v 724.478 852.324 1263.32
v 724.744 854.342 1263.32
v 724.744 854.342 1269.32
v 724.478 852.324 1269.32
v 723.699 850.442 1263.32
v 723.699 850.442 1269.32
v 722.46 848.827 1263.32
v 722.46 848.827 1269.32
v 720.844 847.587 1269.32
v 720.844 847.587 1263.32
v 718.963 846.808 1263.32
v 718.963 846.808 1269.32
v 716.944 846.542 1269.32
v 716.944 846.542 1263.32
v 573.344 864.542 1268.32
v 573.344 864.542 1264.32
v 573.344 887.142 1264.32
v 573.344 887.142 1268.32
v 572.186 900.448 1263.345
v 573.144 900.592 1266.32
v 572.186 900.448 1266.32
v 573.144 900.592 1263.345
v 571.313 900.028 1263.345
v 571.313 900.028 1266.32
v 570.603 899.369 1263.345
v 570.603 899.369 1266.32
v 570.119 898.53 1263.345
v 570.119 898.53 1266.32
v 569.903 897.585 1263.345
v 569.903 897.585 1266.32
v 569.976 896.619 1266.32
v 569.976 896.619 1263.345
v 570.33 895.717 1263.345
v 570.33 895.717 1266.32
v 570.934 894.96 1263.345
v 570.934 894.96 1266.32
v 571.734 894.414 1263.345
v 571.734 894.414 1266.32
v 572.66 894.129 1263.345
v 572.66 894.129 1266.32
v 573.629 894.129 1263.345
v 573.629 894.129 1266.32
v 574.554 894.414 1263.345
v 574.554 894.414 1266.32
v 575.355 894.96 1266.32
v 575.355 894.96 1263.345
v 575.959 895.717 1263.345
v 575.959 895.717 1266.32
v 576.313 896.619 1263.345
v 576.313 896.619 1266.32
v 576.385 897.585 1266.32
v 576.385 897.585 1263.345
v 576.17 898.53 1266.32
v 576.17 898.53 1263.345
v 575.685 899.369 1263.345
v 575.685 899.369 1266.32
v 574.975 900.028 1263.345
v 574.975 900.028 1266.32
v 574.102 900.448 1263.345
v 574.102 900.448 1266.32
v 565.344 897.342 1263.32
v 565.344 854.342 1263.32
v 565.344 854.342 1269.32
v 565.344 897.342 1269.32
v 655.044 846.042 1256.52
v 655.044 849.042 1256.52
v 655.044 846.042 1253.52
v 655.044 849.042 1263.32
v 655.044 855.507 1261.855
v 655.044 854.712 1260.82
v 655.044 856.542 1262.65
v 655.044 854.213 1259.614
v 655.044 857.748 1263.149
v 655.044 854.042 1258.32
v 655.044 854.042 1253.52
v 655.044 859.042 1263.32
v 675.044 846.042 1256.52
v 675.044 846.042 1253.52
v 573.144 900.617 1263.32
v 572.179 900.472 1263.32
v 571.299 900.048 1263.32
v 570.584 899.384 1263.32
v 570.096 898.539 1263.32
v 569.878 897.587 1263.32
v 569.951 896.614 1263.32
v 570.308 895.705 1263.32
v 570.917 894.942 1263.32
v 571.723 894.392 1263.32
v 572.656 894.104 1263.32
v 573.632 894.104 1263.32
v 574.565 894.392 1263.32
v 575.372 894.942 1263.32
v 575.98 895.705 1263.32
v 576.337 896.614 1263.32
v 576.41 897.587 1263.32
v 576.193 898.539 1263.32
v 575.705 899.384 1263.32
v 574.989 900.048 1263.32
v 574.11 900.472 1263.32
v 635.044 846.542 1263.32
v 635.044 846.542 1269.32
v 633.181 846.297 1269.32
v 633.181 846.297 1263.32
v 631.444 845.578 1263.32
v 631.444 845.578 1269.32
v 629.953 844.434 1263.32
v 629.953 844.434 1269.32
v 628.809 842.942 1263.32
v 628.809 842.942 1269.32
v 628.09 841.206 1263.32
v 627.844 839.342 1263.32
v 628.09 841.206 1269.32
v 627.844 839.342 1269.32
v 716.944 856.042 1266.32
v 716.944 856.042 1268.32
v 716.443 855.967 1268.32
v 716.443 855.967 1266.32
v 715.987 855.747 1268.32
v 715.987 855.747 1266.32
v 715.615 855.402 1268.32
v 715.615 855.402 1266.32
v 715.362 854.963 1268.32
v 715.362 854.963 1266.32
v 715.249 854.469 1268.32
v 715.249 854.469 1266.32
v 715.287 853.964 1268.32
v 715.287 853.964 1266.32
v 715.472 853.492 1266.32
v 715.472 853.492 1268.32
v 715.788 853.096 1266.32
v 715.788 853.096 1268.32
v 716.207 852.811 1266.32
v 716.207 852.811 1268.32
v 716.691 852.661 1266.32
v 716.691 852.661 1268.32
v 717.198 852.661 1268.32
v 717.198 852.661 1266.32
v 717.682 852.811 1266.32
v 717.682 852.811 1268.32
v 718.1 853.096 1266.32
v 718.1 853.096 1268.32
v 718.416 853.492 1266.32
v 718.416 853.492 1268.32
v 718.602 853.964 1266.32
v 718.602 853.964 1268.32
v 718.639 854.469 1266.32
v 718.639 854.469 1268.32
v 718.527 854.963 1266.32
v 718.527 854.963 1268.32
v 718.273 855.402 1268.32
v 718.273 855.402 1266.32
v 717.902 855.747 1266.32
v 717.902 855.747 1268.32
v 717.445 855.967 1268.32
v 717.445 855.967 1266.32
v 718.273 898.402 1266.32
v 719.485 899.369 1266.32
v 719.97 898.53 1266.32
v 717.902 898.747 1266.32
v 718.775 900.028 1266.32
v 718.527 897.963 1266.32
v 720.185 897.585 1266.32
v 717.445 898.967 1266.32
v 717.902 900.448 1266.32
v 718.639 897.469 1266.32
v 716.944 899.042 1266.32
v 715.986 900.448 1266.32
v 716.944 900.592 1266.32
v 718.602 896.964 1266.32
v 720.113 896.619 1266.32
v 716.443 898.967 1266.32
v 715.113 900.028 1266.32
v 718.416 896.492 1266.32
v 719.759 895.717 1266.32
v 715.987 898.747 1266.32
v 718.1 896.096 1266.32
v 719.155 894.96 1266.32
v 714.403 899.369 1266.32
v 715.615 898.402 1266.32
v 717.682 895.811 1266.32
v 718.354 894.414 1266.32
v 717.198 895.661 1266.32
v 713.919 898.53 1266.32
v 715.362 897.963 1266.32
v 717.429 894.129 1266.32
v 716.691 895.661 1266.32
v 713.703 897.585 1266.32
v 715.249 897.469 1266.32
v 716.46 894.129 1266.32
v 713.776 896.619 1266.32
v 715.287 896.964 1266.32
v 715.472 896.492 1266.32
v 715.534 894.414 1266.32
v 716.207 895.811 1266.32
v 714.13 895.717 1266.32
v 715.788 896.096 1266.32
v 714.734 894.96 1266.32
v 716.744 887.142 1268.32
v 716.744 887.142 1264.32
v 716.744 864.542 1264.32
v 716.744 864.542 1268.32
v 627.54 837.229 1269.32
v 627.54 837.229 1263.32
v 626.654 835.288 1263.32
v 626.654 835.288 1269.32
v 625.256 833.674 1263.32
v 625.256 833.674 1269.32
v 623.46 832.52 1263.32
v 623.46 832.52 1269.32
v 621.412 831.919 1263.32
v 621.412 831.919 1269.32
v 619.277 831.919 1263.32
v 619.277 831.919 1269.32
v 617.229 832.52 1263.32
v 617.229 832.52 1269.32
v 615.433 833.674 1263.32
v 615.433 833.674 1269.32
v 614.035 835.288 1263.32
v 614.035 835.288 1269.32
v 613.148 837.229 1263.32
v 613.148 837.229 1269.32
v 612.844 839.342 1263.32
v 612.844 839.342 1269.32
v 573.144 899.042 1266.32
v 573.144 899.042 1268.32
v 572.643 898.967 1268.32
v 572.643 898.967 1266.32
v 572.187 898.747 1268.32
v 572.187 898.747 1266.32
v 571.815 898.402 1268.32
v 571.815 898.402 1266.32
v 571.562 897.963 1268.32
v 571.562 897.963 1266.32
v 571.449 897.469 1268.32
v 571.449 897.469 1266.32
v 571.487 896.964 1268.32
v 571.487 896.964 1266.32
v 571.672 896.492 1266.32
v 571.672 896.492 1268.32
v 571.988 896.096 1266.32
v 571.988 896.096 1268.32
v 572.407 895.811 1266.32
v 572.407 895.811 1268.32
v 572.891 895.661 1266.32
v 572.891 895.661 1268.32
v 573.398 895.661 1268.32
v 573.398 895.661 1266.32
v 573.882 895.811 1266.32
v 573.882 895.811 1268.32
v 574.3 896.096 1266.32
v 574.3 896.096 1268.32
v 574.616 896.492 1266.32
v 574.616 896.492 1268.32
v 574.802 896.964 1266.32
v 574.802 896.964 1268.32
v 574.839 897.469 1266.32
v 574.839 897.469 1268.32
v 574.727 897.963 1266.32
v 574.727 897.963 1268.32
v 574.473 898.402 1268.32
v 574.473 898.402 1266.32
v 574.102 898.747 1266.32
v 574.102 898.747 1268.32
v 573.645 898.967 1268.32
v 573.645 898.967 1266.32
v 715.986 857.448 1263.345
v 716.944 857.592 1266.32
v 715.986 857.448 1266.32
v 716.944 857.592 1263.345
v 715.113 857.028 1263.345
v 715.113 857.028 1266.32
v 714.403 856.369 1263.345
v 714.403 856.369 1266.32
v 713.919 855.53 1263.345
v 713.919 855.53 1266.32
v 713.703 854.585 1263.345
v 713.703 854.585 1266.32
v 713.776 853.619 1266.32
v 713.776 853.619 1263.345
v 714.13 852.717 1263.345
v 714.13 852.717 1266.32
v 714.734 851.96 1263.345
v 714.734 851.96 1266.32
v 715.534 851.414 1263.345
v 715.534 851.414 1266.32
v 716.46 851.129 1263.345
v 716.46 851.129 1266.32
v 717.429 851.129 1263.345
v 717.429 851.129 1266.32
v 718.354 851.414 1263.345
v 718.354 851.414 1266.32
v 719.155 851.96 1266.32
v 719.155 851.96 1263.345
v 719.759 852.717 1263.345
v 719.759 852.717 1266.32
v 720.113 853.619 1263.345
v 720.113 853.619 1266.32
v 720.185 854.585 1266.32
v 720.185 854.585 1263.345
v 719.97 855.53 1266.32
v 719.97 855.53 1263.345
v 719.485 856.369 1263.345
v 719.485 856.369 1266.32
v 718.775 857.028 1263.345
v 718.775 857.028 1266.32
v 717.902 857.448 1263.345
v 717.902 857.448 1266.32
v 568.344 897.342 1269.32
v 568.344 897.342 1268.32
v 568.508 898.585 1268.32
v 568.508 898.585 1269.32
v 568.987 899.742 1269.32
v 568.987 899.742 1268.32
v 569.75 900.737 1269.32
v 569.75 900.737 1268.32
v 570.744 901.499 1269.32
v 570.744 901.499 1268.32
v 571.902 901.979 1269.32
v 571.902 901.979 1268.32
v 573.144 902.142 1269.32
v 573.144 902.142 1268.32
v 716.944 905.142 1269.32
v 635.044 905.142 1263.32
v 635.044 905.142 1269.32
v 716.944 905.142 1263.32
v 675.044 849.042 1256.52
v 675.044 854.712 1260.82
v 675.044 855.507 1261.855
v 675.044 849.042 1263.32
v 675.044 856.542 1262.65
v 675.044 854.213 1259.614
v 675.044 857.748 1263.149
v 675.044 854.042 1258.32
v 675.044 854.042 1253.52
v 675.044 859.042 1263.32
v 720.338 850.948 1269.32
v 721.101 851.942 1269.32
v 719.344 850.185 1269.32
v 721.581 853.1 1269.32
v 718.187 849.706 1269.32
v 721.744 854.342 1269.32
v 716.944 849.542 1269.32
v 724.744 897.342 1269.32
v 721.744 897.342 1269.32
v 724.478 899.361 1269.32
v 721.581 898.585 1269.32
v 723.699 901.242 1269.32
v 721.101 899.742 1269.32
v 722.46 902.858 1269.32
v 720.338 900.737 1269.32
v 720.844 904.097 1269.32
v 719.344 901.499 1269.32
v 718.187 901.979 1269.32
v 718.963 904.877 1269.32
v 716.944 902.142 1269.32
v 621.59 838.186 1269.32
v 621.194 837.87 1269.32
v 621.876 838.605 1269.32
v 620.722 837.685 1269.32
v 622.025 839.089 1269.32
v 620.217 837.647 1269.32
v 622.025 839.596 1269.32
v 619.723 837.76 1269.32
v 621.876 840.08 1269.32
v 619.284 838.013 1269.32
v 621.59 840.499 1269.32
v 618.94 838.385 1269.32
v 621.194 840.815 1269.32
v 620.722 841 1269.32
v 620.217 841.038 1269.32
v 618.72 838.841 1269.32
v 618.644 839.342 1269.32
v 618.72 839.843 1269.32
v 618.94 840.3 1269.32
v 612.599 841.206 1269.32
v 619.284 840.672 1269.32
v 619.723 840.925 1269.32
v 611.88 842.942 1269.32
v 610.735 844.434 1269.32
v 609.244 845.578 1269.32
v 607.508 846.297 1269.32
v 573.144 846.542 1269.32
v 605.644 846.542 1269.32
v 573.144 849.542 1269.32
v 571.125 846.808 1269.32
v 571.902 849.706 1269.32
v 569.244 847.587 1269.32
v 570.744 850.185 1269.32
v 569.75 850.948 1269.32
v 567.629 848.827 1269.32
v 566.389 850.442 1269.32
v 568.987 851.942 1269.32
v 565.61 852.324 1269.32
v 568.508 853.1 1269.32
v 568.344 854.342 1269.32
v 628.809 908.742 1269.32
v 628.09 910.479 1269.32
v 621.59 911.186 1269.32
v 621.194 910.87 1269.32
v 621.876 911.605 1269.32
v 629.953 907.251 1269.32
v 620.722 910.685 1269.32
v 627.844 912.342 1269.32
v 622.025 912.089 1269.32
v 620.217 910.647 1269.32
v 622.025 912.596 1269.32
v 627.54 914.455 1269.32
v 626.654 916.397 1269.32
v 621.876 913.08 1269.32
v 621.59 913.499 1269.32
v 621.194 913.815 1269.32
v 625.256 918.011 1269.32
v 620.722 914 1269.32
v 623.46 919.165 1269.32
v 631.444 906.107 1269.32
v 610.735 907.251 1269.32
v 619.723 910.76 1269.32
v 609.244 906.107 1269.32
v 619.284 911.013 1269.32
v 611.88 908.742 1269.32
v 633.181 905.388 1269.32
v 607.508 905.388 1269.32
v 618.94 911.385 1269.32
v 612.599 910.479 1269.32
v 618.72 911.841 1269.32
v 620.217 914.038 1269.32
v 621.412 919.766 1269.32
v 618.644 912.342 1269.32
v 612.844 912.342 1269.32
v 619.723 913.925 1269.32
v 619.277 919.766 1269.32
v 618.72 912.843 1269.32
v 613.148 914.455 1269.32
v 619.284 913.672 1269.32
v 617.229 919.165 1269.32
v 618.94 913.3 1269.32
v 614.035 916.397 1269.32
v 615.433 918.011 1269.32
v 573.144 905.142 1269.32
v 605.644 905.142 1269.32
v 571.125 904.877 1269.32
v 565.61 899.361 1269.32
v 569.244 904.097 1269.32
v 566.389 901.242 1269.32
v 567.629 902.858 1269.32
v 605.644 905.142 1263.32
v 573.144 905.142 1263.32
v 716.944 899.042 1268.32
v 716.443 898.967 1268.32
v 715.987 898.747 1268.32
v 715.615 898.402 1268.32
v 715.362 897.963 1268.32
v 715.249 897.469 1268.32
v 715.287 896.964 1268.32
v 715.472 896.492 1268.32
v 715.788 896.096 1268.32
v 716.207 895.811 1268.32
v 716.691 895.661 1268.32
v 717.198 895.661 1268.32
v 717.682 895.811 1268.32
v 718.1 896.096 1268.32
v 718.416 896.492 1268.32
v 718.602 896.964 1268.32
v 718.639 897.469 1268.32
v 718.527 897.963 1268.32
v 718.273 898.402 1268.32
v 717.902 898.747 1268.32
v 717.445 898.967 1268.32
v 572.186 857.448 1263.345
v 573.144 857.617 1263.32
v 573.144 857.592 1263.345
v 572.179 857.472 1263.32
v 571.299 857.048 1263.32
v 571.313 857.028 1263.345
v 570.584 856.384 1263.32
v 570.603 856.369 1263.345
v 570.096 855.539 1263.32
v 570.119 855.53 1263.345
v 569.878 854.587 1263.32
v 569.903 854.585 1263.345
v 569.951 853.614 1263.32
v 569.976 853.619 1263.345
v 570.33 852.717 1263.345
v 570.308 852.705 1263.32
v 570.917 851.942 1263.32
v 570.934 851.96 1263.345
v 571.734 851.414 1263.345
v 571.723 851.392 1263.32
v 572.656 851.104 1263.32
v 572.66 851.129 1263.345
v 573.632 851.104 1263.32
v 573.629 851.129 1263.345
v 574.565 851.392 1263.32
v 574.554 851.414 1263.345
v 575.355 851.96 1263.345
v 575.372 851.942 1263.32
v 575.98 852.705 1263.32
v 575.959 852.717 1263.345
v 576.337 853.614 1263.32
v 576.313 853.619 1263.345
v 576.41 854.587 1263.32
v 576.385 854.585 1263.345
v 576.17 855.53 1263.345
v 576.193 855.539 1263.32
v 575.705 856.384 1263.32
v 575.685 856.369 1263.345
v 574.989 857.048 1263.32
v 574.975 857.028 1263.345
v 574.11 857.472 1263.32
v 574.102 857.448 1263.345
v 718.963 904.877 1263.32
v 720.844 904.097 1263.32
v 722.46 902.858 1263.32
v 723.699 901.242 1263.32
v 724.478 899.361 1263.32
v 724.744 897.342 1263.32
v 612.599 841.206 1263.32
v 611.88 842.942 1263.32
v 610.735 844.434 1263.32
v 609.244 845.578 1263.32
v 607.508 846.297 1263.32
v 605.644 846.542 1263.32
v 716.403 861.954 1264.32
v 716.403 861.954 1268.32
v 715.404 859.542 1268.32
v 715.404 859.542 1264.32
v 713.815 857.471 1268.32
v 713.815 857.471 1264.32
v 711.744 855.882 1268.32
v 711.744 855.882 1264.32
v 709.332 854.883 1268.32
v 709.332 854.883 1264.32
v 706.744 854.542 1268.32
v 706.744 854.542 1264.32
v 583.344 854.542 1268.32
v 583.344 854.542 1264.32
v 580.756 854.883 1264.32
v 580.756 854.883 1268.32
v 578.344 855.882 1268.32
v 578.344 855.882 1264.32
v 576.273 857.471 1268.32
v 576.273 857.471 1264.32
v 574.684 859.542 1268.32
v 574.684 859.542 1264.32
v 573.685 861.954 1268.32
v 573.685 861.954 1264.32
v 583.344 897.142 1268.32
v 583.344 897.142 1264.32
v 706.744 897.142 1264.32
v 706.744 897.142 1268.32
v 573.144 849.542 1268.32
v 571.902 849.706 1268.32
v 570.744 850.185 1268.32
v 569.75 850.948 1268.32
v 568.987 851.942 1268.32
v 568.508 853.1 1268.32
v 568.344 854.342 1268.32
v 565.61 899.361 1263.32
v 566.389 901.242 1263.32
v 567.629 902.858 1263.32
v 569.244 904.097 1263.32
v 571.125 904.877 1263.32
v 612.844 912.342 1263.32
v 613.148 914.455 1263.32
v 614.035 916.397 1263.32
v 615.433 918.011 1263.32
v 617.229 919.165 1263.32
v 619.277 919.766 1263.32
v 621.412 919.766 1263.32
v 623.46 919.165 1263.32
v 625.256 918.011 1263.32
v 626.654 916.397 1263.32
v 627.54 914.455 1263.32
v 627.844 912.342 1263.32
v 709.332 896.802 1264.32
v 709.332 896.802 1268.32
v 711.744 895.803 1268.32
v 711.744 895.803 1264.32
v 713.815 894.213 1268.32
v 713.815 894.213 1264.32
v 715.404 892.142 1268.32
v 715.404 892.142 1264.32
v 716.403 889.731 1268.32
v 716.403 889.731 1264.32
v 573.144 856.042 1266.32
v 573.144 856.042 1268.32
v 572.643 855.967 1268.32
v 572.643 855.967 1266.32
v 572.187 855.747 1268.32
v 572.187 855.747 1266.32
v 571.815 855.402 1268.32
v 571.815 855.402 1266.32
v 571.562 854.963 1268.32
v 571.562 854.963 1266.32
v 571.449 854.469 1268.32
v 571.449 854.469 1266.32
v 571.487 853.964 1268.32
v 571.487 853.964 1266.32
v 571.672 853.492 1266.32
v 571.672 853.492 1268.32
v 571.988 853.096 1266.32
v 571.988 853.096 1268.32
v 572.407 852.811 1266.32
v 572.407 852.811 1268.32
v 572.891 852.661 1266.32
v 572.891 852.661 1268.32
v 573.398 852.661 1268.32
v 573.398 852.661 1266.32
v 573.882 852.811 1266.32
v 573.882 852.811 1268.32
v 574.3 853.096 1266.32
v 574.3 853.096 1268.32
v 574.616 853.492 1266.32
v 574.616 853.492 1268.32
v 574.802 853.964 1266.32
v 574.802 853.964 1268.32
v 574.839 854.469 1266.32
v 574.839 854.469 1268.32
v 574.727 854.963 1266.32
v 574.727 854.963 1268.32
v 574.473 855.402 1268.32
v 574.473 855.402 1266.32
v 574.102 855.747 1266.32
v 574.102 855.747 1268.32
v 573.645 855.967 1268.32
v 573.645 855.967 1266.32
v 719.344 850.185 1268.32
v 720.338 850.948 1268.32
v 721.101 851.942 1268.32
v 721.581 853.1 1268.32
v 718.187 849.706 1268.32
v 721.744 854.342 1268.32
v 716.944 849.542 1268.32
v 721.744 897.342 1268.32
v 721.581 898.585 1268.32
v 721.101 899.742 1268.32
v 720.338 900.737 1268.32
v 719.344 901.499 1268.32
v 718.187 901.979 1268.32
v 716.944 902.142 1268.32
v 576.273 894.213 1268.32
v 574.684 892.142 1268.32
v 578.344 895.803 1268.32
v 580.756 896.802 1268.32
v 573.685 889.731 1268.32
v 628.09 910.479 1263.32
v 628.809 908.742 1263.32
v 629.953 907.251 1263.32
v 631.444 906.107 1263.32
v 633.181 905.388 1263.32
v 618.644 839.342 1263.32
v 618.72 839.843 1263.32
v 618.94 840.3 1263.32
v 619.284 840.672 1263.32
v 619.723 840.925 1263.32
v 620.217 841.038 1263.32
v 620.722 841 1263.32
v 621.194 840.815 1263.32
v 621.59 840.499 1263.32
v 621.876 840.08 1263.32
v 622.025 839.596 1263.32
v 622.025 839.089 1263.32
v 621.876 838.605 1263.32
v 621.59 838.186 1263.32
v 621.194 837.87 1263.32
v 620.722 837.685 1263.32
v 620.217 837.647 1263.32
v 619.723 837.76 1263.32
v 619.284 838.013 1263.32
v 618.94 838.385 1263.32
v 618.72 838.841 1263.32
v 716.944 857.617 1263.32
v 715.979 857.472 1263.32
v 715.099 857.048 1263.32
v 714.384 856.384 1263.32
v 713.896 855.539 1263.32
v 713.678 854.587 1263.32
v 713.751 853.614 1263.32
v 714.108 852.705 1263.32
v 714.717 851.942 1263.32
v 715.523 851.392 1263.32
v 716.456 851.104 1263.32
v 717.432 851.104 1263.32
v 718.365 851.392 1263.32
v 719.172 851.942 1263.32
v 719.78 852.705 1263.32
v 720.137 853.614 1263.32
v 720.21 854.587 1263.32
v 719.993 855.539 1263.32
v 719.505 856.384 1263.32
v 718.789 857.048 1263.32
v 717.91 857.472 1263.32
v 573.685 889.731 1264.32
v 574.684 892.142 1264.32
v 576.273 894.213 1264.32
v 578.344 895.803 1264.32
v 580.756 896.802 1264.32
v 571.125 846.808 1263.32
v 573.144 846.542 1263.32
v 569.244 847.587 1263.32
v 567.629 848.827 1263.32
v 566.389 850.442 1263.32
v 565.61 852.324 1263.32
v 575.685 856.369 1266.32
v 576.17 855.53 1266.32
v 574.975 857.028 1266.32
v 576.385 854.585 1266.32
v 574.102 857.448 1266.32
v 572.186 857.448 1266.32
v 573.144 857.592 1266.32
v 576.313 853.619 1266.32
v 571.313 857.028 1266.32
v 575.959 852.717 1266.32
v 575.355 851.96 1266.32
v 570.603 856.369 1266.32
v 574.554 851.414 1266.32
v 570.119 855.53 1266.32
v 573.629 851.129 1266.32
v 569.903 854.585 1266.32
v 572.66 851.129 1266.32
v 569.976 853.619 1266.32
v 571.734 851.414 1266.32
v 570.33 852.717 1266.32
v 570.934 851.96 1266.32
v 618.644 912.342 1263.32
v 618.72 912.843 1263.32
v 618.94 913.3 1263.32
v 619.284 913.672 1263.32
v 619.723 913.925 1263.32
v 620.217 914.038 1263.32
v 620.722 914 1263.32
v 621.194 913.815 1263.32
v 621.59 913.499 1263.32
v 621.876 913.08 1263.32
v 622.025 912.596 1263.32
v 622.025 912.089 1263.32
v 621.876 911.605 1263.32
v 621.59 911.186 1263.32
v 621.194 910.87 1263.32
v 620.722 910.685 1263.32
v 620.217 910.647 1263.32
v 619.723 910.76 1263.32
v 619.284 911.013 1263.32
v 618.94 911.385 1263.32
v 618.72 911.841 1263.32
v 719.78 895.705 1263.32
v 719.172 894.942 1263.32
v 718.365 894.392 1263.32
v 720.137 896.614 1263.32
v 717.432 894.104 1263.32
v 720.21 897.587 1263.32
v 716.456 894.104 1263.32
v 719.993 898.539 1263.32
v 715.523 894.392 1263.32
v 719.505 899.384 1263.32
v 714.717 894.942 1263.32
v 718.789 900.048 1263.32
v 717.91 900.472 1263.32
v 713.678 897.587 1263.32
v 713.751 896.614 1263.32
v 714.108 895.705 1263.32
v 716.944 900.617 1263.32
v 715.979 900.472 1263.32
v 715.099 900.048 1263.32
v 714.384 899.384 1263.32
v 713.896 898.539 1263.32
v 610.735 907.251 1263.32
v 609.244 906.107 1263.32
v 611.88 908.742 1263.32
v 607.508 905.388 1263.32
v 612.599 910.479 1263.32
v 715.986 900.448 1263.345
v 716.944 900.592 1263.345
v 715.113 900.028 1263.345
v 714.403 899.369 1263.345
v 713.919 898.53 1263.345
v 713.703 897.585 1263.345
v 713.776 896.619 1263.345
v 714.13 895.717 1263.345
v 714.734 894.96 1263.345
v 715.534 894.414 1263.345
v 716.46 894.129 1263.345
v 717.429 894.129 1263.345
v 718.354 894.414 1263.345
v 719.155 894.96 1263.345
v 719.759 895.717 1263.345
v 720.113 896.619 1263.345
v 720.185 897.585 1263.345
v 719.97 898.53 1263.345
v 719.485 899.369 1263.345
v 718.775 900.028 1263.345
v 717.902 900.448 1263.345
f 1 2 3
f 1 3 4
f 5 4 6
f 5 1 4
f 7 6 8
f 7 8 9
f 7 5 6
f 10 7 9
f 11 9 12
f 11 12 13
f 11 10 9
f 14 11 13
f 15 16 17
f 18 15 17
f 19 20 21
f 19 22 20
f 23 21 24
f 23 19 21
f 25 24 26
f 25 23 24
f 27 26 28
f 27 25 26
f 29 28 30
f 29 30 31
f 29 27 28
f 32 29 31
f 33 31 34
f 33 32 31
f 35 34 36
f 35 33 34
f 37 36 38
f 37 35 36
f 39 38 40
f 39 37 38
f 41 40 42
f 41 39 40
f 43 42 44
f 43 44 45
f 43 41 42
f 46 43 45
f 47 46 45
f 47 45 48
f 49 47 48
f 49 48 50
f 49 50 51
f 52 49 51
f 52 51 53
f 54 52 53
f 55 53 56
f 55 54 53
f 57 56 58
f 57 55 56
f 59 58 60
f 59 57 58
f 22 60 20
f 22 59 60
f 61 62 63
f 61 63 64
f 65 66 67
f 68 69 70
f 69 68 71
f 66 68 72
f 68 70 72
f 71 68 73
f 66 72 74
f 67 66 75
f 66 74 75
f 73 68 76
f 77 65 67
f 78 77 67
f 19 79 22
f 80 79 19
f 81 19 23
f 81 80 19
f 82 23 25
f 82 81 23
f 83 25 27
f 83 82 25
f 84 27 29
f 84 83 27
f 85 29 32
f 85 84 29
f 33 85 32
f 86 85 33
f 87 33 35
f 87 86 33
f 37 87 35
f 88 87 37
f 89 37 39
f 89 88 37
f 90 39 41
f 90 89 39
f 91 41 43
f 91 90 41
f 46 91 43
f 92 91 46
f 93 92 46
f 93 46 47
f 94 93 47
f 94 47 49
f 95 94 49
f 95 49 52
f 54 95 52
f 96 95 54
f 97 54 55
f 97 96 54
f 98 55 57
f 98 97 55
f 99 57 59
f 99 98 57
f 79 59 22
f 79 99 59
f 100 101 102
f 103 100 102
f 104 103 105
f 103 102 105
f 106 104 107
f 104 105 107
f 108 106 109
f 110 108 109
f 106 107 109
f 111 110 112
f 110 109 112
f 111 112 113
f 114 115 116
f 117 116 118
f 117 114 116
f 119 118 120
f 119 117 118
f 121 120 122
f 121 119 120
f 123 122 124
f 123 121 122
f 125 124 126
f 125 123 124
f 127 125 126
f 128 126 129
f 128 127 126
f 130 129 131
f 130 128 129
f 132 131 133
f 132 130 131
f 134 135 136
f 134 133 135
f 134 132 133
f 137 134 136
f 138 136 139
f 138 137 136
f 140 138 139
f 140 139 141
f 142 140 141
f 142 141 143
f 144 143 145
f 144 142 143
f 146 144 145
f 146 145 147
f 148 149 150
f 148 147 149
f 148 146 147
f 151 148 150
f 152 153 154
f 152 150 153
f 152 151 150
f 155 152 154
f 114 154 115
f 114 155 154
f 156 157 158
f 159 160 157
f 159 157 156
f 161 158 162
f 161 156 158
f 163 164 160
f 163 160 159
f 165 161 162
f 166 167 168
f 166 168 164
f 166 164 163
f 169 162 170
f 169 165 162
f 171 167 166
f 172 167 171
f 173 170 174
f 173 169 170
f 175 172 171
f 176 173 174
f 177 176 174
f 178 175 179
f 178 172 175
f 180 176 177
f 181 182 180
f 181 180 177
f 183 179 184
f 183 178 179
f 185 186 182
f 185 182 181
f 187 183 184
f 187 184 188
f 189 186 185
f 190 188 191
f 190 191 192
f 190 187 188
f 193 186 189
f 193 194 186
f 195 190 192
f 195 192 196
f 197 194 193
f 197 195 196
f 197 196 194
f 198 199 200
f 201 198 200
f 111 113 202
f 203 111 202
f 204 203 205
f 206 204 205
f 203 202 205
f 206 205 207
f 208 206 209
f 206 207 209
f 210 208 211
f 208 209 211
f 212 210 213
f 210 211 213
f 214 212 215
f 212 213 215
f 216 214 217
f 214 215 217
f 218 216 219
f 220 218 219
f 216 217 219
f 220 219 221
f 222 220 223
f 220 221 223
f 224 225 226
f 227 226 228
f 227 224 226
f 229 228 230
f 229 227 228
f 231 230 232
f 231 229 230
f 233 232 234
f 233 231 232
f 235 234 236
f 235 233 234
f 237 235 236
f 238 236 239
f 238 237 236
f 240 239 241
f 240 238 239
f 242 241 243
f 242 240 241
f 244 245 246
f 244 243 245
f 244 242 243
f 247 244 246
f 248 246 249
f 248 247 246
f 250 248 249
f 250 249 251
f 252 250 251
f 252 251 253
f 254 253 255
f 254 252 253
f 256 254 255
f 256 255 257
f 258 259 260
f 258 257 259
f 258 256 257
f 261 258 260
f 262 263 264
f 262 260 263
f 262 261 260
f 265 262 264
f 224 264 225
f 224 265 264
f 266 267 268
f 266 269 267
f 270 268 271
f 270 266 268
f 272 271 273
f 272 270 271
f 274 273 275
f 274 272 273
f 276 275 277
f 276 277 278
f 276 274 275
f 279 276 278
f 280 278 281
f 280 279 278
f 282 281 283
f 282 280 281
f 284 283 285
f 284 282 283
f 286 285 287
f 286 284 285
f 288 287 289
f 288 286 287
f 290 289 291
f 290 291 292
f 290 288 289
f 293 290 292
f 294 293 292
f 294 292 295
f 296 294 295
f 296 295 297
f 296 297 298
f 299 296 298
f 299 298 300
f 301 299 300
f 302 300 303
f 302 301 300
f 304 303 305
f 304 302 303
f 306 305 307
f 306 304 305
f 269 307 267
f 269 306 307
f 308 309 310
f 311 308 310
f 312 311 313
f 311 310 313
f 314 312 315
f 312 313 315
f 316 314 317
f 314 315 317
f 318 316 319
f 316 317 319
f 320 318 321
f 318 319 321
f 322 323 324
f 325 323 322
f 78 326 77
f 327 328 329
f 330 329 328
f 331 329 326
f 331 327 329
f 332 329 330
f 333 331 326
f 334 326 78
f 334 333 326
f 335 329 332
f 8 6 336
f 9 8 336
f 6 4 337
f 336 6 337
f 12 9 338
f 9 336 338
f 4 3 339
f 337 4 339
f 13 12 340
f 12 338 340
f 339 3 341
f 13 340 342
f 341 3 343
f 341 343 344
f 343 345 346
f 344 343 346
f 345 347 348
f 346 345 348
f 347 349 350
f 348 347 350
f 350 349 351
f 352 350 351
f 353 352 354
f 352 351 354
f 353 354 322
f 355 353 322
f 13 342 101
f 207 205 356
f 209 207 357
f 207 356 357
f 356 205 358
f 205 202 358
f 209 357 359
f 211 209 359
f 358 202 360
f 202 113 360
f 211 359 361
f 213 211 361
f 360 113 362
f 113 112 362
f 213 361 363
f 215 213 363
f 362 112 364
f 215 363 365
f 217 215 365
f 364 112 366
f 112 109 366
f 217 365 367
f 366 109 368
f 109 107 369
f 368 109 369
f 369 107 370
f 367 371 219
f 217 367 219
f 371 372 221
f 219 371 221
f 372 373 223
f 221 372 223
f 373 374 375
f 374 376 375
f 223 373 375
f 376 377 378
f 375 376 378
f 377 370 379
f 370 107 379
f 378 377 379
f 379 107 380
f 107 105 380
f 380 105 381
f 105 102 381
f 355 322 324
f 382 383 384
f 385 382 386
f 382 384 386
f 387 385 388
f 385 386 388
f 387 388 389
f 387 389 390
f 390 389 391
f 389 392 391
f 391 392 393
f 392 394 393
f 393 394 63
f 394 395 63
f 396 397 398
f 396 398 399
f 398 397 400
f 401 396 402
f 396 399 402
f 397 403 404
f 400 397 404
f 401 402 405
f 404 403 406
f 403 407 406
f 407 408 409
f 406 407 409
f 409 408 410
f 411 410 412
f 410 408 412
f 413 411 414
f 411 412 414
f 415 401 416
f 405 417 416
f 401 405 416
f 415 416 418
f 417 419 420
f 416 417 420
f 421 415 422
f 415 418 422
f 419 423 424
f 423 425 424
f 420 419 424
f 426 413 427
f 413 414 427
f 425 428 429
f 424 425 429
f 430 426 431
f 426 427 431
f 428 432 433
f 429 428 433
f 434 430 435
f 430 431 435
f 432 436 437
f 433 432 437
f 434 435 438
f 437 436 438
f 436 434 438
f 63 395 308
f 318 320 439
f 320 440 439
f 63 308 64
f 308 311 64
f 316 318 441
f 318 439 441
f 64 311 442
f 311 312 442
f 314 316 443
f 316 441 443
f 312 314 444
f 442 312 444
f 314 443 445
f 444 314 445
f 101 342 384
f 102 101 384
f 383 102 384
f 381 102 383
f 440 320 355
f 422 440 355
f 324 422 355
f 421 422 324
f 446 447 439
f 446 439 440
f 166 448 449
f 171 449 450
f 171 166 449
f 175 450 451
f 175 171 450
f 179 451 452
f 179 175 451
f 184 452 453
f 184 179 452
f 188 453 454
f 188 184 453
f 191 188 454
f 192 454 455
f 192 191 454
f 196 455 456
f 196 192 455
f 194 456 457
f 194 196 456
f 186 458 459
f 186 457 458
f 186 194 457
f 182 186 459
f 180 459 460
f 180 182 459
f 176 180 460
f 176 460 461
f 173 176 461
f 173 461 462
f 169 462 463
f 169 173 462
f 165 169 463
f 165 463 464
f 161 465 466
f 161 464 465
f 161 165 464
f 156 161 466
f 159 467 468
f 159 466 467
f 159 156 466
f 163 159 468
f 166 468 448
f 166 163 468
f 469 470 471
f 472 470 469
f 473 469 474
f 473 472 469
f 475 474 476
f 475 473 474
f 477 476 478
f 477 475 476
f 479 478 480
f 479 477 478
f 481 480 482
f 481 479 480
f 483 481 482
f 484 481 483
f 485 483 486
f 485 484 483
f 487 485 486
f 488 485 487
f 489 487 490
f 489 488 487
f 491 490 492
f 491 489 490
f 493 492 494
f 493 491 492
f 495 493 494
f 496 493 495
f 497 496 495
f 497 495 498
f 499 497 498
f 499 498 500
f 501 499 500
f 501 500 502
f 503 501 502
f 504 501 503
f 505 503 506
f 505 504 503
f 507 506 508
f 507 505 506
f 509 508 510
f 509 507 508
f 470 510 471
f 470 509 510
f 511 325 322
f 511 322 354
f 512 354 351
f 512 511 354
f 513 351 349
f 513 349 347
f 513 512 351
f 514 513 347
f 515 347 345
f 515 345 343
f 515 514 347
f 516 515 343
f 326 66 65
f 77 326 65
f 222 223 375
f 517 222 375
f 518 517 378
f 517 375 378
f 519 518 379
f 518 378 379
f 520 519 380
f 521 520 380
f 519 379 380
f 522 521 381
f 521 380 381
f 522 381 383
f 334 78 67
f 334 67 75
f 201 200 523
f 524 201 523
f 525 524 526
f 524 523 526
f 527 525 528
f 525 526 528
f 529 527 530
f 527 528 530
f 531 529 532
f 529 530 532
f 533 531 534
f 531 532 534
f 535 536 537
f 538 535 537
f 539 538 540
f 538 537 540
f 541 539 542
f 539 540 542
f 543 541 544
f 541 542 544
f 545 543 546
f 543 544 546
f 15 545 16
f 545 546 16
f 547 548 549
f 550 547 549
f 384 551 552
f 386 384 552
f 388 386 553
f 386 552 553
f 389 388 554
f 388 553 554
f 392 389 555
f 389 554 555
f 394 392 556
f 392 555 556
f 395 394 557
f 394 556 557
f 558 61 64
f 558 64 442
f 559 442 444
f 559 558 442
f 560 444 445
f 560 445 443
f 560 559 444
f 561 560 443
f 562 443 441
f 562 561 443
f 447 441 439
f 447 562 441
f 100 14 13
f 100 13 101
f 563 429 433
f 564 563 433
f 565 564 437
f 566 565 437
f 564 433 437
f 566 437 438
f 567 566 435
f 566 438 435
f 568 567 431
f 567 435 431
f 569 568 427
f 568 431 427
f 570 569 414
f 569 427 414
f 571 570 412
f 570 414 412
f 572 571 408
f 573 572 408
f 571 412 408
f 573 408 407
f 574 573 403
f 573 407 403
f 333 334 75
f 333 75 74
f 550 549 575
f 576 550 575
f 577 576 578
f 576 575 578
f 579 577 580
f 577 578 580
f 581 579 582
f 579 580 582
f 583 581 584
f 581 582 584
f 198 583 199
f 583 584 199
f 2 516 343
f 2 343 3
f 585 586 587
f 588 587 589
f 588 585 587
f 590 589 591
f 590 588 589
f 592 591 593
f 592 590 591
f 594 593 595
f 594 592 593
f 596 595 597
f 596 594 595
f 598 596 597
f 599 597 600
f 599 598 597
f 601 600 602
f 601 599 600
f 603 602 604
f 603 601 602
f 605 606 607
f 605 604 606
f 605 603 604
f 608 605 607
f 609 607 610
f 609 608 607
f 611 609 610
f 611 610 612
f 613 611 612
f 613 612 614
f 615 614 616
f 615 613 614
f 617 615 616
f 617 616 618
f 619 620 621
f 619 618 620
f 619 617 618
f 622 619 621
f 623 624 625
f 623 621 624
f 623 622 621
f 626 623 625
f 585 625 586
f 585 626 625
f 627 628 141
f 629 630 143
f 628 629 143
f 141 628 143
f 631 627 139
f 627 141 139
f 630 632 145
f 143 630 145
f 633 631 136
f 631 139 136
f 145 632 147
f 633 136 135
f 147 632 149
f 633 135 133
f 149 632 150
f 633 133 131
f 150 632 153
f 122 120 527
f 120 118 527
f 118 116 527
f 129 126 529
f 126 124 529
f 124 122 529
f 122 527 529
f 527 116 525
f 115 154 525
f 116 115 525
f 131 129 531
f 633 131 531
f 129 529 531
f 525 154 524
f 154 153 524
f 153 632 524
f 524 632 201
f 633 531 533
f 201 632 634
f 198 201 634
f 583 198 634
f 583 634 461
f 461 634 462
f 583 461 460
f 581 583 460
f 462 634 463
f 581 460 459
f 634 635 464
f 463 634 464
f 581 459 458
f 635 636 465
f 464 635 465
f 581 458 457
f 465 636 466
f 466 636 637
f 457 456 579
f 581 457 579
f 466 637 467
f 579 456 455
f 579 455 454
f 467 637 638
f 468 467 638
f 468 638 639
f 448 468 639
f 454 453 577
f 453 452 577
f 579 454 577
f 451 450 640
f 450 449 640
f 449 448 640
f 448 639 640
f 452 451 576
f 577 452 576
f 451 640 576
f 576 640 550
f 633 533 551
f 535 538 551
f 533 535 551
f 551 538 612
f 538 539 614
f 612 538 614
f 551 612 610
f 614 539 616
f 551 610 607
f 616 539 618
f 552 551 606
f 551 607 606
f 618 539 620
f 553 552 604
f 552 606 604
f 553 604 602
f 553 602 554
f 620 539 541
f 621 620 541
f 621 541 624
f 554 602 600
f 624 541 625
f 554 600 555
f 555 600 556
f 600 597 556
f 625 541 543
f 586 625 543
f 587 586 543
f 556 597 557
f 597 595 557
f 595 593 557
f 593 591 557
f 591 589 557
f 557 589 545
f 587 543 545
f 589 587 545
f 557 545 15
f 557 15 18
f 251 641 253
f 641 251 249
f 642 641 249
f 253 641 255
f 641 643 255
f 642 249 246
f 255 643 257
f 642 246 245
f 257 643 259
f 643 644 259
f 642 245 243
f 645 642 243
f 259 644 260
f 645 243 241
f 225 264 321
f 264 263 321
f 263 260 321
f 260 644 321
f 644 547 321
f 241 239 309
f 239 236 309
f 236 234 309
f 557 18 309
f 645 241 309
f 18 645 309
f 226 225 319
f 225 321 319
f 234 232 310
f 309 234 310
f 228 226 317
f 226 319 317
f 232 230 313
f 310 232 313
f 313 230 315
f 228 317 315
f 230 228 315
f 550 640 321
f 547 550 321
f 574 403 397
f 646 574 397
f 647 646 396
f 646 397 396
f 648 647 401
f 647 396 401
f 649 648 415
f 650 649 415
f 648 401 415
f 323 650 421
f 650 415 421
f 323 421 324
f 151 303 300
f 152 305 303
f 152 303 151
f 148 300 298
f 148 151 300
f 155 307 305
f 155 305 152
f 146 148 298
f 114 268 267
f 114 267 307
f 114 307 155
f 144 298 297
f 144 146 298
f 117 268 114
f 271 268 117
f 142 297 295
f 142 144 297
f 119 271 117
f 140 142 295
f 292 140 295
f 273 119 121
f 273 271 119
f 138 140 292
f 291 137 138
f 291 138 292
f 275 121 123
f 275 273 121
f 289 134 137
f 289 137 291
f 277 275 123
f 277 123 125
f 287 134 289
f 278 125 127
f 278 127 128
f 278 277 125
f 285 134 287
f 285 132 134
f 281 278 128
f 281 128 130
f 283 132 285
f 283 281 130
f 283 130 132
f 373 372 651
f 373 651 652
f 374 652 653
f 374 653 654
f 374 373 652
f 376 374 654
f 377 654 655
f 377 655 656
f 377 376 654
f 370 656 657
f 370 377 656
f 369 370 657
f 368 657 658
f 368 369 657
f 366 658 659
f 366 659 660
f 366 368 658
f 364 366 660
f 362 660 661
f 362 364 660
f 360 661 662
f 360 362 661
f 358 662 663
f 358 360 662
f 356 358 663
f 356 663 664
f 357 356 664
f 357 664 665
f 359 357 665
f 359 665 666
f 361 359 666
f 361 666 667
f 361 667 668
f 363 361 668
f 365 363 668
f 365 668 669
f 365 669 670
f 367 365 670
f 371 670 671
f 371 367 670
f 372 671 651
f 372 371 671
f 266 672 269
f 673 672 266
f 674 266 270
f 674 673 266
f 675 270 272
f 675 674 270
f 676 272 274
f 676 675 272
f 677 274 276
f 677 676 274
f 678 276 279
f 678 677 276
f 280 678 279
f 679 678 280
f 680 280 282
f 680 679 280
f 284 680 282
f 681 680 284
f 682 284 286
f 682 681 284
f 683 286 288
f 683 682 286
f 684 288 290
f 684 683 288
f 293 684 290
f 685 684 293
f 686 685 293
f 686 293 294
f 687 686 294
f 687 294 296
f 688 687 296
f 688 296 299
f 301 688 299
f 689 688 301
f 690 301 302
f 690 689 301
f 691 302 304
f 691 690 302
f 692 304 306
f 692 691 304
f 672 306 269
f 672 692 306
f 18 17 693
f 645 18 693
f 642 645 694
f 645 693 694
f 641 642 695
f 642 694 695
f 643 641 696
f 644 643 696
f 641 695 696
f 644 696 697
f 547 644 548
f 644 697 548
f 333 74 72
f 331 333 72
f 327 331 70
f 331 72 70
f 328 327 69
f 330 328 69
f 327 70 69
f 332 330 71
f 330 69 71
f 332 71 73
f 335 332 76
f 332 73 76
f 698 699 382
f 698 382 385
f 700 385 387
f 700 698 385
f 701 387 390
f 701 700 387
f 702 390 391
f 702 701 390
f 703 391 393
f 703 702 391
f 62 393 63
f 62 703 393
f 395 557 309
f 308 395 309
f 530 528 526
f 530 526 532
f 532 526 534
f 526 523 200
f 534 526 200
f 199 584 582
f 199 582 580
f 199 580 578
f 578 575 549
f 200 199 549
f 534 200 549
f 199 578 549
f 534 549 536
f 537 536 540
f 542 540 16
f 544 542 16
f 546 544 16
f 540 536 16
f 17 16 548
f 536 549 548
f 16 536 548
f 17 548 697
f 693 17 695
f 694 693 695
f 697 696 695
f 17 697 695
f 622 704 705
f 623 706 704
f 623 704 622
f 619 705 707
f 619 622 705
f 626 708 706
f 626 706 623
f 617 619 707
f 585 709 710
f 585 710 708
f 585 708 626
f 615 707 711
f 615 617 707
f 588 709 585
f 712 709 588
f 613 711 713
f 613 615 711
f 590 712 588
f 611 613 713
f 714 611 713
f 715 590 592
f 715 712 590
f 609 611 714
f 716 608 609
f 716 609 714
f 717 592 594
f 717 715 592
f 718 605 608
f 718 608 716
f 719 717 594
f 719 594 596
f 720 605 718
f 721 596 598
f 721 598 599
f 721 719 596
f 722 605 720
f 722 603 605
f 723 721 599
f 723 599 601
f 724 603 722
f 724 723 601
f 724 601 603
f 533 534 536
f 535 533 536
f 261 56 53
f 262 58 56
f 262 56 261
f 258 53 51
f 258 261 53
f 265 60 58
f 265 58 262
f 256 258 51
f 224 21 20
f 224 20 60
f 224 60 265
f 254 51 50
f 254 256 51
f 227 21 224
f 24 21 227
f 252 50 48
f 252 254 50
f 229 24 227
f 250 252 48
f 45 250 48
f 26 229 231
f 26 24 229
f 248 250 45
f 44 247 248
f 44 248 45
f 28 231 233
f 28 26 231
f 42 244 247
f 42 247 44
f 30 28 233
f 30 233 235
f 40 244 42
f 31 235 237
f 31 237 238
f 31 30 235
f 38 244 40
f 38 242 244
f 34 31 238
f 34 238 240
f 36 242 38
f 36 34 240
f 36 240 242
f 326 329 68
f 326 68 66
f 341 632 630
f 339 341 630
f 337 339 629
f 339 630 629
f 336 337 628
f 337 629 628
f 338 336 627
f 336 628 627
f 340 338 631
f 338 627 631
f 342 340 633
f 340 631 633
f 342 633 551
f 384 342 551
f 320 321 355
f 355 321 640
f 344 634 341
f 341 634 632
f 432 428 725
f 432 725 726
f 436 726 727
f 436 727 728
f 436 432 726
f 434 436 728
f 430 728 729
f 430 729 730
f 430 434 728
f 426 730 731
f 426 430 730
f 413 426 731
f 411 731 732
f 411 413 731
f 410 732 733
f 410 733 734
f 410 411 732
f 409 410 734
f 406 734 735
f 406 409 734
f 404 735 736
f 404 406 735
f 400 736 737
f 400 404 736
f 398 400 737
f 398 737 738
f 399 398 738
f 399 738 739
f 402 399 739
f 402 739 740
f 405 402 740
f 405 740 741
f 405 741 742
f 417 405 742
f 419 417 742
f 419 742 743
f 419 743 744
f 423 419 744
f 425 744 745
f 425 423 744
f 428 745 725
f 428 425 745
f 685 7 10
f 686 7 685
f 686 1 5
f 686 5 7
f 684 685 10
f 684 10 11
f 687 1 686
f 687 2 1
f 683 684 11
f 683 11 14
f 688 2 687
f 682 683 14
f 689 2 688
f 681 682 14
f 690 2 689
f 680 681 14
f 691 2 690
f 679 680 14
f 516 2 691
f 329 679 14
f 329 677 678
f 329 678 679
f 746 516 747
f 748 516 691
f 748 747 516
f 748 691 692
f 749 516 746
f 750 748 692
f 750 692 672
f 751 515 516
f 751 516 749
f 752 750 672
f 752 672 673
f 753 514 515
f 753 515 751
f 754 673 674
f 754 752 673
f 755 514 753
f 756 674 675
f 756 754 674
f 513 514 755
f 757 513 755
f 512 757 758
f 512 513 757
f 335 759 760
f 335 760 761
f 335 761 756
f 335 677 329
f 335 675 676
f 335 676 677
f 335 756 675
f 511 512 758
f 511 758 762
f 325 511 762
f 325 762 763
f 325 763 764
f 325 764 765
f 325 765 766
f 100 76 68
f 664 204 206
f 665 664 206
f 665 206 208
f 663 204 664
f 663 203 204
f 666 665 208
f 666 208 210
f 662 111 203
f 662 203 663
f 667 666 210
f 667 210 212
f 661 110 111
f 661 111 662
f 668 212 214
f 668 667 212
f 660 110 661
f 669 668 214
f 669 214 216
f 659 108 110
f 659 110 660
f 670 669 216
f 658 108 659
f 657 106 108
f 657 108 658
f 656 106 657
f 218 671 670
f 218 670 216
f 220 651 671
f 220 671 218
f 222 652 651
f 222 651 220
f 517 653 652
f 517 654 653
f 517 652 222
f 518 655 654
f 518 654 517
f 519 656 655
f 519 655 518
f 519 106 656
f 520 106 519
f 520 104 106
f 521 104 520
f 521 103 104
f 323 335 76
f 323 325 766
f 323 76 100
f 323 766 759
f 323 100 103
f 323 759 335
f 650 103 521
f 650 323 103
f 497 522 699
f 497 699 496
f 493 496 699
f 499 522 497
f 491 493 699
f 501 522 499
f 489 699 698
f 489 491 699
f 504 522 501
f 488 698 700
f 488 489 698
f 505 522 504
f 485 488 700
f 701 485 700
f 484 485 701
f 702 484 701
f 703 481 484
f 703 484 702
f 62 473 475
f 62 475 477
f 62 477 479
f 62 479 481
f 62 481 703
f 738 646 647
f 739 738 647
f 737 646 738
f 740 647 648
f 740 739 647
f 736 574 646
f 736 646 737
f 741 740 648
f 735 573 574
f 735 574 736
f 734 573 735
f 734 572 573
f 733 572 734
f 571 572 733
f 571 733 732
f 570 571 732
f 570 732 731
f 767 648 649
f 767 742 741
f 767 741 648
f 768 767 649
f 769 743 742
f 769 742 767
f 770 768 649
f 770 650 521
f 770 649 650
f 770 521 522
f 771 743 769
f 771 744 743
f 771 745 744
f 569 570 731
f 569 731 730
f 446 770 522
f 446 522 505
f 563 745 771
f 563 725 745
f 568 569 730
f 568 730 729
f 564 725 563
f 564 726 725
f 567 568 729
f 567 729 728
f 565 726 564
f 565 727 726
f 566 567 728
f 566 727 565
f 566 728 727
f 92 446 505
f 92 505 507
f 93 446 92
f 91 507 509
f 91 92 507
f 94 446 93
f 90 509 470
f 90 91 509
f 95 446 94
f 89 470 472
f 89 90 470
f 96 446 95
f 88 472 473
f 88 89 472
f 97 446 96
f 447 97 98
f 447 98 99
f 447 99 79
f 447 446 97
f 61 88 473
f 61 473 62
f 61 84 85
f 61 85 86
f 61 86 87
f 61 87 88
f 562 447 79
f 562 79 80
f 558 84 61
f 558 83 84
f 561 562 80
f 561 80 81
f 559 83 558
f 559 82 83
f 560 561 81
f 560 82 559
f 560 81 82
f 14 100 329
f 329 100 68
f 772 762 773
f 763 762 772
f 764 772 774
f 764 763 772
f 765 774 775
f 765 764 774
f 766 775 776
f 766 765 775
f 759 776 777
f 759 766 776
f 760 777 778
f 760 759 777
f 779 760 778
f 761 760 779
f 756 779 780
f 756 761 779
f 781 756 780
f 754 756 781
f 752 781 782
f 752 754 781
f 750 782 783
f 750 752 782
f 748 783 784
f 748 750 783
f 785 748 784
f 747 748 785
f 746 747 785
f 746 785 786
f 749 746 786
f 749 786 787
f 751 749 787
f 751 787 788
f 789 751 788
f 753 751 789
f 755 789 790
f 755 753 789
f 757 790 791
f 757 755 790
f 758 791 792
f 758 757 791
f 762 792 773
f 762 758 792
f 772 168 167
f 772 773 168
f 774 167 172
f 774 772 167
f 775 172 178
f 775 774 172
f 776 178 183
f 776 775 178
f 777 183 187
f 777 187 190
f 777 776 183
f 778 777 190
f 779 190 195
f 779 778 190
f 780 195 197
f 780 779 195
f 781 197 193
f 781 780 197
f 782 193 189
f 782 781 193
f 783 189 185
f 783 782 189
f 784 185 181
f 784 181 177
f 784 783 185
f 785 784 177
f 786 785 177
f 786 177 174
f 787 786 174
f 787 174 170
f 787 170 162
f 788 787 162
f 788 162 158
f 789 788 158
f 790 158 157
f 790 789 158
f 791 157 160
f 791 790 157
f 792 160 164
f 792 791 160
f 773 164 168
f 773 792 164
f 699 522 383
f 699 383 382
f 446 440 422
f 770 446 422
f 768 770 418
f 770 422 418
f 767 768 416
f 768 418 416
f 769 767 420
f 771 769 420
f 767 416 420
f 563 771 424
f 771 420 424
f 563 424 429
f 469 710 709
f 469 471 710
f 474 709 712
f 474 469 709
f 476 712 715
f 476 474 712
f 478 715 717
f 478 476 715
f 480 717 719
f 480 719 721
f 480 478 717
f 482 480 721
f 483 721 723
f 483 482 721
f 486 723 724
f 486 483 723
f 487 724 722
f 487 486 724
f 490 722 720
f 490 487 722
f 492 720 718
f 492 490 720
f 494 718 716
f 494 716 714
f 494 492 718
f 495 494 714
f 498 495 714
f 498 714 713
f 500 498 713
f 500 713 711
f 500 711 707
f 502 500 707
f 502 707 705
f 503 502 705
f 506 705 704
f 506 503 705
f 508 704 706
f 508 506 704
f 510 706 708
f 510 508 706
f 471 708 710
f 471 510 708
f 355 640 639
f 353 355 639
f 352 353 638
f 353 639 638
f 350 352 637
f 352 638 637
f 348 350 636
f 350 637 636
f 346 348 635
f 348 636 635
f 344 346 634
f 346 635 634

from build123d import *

# Parameters (mm, degrees)
BOSS_EXTRUDE1_DEPTH           = 1
BOSS_EXTRUDE2_START           = 4
BOSS_EXTRUDE2_DEPTH           = 4
BOSS_EXTRUDE3_START           = 1
BOSS_EXTRUDE3_DEPTH           = 1
CBORE_FOR_M3_SHCS1_AT_2_COUNT = 2
CBORE_FOR_M3_SHCS1_AT_2_PITCH = 143.8
CBORE_FOR_M3_SHCS1_AT_3_COUNT = 2
CBORE_FOR_M3_SHCS1_AT_3_PITCH = 150.091438796
CBORE_FOR_M3_SHCS1_AT_4_COUNT = 2
CBORE_FOR_M3_SHCS1_AT_4_PITCH = 43
BOSS_EXTRUDE4_START           = -6
BOSS_EXTRUDE4_OUTLINE_R       = 1.7
BOSS_EXTRUDE4_DEPTH           = 6
BOSS_EXTRUDE5_DEPTH           = 20


# Read off the part's stored shape, not the designer's step: Boss-Extrude4
with BuildPart() as part:
    # Sketch1 → Boss-Extrude1 (new body)
    with BuildSketch(Plane(origin=(0, 0, 1268.319699828), x_dir=(-1, 0, 0), z_dir=(0, 0, -1))):
        with BuildLine():
            Line((-565.344205178, 854.342421724), (-565.344205178, 897.342374326))
            ThreePointArc((-565.344205178, 897.342374326), (-567.628754858, 902.85784955), (-573.144231788, 905.142395114))
            Line((-573.144231788, 905.142395114), (-716.944184389, 905.142395114))
            ThreePointArc((-716.944184389, 905.142395114), (-722.459659614, 902.857845434), (-724.744205178, 897.342368505))
            Line((-724.744205178, 897.342368505), (-724.744205178, 854.342415903))
            ThreePointArc((-724.744205178, 854.342415903), (-722.459655498, 848.826940679), (-716.944178568, 846.542395115))
            Line((-716.944178568, 846.542395115), (-573.144231788, 846.542395115))
            ThreePointArc((-573.144231788, 846.542395115), (-567.6287528, 848.826942737), (-565.344205178, 854.342421724))
        make_face()
        with BuildLine():
            Line((-568.344205178, 854.342399549), (-568.344205178, 897.342395114))
            ThreePointArc((-568.344205178, 897.342395114), (-569.750074712, 900.736528717), (-573.144209613, 902.142395114))
            Line((-573.144209613, 902.142395114), (-716.944205178, 902.142395114))
            ThreePointArc((-716.944205178, 902.142395114), (-720.33833878, 900.736525581), (-721.744205178, 897.342390679))
            Line((-721.744205178, 897.342390679), (-721.744205178, 854.342395114))
            ThreePointArc((-721.744205178, 854.342395114), (-720.338335644, 850.948261512), (-716.944200743, 849.542395115))
            Line((-716.944200743, 849.542395115), (-573.144209613, 849.542395115))
            ThreePointArc((-573.144209613, 849.542395115), (-569.750073144, 850.94826308), (-568.344205178, 854.342399549))
        make_face(mode=Mode.SUBTRACT)
    extrude(amount=-BOSS_EXTRUDE1_DEPTH)

    # Sketch2 → Boss-Extrude2 (add)
    with BuildSketch(Plane(origin=(0, 0, 1268.319699828), x_dir=(-1, 0, 0), z_dir=(0, 0, -1)).offset(BOSS_EXTRUDE2_START)):
        with BuildLine():
            Line((-565.344205178, 854.342421724), (-565.344205178, 897.342374326))
            ThreePointArc((-565.344205178, 897.342374326), (-567.628754858, 902.85784955), (-573.144231788, 905.142395114))
            Line((-573.144231788, 905.142395114), (-716.944184389, 905.142395114))
            ThreePointArc((-716.944184389, 905.142395114), (-722.459659614, 902.857845434), (-724.744205178, 897.342368505))
            Line((-724.744205178, 897.342368505), (-724.744205178, 854.342415903))
            ThreePointArc((-724.744205178, 854.342415903), (-722.459655498, 848.826940679), (-716.944178568, 846.542395115))
            Line((-716.944178568, 846.542395115), (-573.144231788, 846.542395115))
            ThreePointArc((-573.144231788, 846.542395115), (-567.6287528, 848.826942737), (-565.344205178, 854.342421724))
        make_face()
        with BuildLine():
            Line((-573.344205178, 864.542395115), (-573.344205178, 887.142395114))
            ThreePointArc((-573.344205178, 887.142395114), (-576.273137366, 894.213462926), (-583.344205178, 897.142395114))
            Line((-583.344205178, 897.142395114), (-706.744205178, 897.142395114))
            ThreePointArc((-706.744205178, 897.142395114), (-713.81527299, 894.213462926), (-716.744205178, 887.142395114))
            Line((-716.744205178, 887.142395114), (-716.744205178, 864.542395115))
            ThreePointArc((-716.744205178, 864.542395115), (-713.81527299, 857.471327303), (-706.744205178, 854.542395115))
            Line((-706.744205178, 854.542395115), (-583.344205178, 854.542395115))
            ThreePointArc((-583.344205178, 854.542395115), (-576.273137366, 857.471327303), (-573.344205178, 864.542395115))
        make_face(mode=Mode.SUBTRACT)
    extrude(amount=-BOSS_EXTRUDE2_DEPTH)

    # Sketch3 → Boss-Extrude3 (add)
    with BuildSketch(Plane(origin=(0, 0, 1264.319699828), x_dir=(-1, 0, 0), z_dir=(0, 0, -1)).offset(BOSS_EXTRUDE3_START)):
        with BuildLine():
            Line((-565.344205178, 854.342421724), (-565.344205178, 897.342374326))
            ThreePointArc((-565.344205178, 897.342374326), (-567.628754858, 902.85784955), (-573.144231788, 905.142395114))
            Line((-573.144231788, 905.142395114), (-716.944184389, 905.142395114))
            ThreePointArc((-716.944184389, 905.142395114), (-722.459659614, 902.857845434), (-724.744205178, 897.342368505))
            Line((-724.744205178, 897.342368505), (-724.744205178, 854.342415903))
            ThreePointArc((-724.744205178, 854.342415903), (-722.459655498, 848.826940679), (-716.944178568, 846.542395115))
            Line((-716.944178568, 846.542395115), (-573.144231788, 846.542395115))
            ThreePointArc((-573.144231788, 846.542395115), (-567.6287528, 848.826942737), (-565.344205178, 854.342421724))
        make_face()
    extrude(amount=-BOSS_EXTRUDE3_DEPTH)

    # Sketch5 → CBORE for M3 SHCS1 (revolve, cut)
    with BuildSketch(Plane(origin=(716.944205178, 897.342395114, 1263.319699828), x_dir=(0, 1, 0), z_dir=(1, 0, 0))):
        Polygon((0, 0), (0, 6), (1.7, 6), (1.7, 3), (3.25, 3), (3.25, 0.025), (3.275, 0), align=None)
    cbore_for_m3_shcs1 = revolve(axis=Axis((716.944205178, 897.342395114, 1256.969699828), (0, 0, 1)), mode=Mode.SUBTRACT)

    # CBORE for M3 SHCS1 at 2: CBORE for M3 SHCS1 ×2
    with Locations(*[(-i * CBORE_FOR_M3_SHCS1_AT_2_PITCH, 0, 0) for i in range(1, CBORE_FOR_M3_SHCS1_AT_2_COUNT)]):
        add(cbore_for_m3_shcs1, mode=Mode.SUBTRACT)

    # CBORE for M3 SHCS1 at 3: CBORE for M3 SHCS1 ×2
    with Locations(*[Vector(-0.958082627184226, -0.2864920234278285, 0) * (i * CBORE_FOR_M3_SHCS1_AT_3_PITCH) for i in range(1, CBORE_FOR_M3_SHCS1_AT_3_COUNT)]):
        add(cbore_for_m3_shcs1, mode=Mode.SUBTRACT)

    # CBORE for M3 SHCS1 at 4: CBORE for M3 SHCS1 ×2
    with Locations(*[(0, -i * CBORE_FOR_M3_SHCS1_AT_4_PITCH, 0) for i in range(1, CBORE_FOR_M3_SHCS1_AT_4_COUNT)]):
        add(cbore_for_m3_shcs1, mode=Mode.SUBTRACT)


with BuildPart() as boss_extrude4_tool:
    # Boss-Extrude4 outline → Boss-Extrude4 (new body)
    # profile 1 of 2: a face of its own
    with BuildSketch(Plane(origin=(0, 0, 1263.319699828), x_dir=(-1, 0, 0), z_dir=(0, 0, -1)).offset(BOSS_EXTRUDE4_START)):
        with BuildLine():
            ThreePointArc((-635.044202268, 846.542389294), (-629.953035501, 844.433558971), (-627.844205178, 839.342392204))
            ThreePointArc((-627.844205178, 839.342392204), (-620.344205178, 831.842392204), (-612.844205178, 839.342392204))
            ThreePointArc((-612.844205178, 839.342392204), (-610.735374855, 844.433558971), (-605.644208088, 846.542389294))
            Line((-605.644208088, 846.542389294), (-635.044202268, 846.542389294))
        make_face()
        with Locations((-620.344205178, 839.342392204)):
            Circle(BOSS_EXTRUDE4_OUTLINE_R, mode=Mode.SUBTRACT)
    # profile 2 of 2: a face of its own
    with BuildSketch(Plane(origin=(0, 0, 1263.319699828), x_dir=(-1, 0, 0), z_dir=(0, 0, -1)).offset(BOSS_EXTRUDE4_START)):
        with BuildLine():
            ThreePointArc((-605.644208088, 905.142395114), (-610.735374855, 907.251225437), (-612.844205178, 912.342392204))
            ThreePointArc((-612.844205178, 912.342392204), (-620.344205178, 919.842392204), (-627.844205178, 912.342392204))
            ThreePointArc((-627.844205178, 912.342392204), (-629.953035501, 907.251225437), (-635.044202268, 905.142395114))
            Line((-635.044202268, 905.142395114), (-605.644208088, 905.142395114))
        make_face()
        with Locations((-620.344205178, 912.342392204)):
            Circle(BOSS_EXTRUDE4_OUTLINE_R, mode=Mode.SUBTRACT)
    extrude(amount=BOSS_EXTRUDE4_DEPTH)


with BuildPart() as part_1:
    add(part.part)


with BuildPart() as part_2:
    # Boss-Extrude4: joined with boss_extrude4_tool
    add(part_1.part.fuse(boss_extrude4_tool.part, tol=0.00001))

    # Sketch7 → Boss-Extrude5 (add)
    with BuildSketch(Plane(origin=(655.044202268, 0, 0), x_dir=(0, 0, -1), z_dir=(1, 0, 0))):
        with BuildLine():
            Line((-1263.319699828, 849.042392204), (-1256.519699828, 849.042392204))
            Line((-1256.519699828, 849.042392204), (-1256.519699828, 846.042392204))
            Line((-1256.519699828, 846.042392204), (-1253.519699828, 846.042392204))
            Line((-1253.519699828, 846.042392204), (-1253.519699828, 854.042392204))
            Line((-1253.519699828, 854.042392204), (-1258.319699828, 854.042392204))
            ThreePointArc((-1258.319699828, 854.042392204), (-1261.855233734, 855.506858298), (-1263.319699828, 859.042392204))
            Line((-1263.319699828, 859.042392204), (-1263.319699828, 849.042392204))
        make_face()
    extrude(amount=BOSS_EXTRUDE5_DEPTH)


solid = part_2.part
